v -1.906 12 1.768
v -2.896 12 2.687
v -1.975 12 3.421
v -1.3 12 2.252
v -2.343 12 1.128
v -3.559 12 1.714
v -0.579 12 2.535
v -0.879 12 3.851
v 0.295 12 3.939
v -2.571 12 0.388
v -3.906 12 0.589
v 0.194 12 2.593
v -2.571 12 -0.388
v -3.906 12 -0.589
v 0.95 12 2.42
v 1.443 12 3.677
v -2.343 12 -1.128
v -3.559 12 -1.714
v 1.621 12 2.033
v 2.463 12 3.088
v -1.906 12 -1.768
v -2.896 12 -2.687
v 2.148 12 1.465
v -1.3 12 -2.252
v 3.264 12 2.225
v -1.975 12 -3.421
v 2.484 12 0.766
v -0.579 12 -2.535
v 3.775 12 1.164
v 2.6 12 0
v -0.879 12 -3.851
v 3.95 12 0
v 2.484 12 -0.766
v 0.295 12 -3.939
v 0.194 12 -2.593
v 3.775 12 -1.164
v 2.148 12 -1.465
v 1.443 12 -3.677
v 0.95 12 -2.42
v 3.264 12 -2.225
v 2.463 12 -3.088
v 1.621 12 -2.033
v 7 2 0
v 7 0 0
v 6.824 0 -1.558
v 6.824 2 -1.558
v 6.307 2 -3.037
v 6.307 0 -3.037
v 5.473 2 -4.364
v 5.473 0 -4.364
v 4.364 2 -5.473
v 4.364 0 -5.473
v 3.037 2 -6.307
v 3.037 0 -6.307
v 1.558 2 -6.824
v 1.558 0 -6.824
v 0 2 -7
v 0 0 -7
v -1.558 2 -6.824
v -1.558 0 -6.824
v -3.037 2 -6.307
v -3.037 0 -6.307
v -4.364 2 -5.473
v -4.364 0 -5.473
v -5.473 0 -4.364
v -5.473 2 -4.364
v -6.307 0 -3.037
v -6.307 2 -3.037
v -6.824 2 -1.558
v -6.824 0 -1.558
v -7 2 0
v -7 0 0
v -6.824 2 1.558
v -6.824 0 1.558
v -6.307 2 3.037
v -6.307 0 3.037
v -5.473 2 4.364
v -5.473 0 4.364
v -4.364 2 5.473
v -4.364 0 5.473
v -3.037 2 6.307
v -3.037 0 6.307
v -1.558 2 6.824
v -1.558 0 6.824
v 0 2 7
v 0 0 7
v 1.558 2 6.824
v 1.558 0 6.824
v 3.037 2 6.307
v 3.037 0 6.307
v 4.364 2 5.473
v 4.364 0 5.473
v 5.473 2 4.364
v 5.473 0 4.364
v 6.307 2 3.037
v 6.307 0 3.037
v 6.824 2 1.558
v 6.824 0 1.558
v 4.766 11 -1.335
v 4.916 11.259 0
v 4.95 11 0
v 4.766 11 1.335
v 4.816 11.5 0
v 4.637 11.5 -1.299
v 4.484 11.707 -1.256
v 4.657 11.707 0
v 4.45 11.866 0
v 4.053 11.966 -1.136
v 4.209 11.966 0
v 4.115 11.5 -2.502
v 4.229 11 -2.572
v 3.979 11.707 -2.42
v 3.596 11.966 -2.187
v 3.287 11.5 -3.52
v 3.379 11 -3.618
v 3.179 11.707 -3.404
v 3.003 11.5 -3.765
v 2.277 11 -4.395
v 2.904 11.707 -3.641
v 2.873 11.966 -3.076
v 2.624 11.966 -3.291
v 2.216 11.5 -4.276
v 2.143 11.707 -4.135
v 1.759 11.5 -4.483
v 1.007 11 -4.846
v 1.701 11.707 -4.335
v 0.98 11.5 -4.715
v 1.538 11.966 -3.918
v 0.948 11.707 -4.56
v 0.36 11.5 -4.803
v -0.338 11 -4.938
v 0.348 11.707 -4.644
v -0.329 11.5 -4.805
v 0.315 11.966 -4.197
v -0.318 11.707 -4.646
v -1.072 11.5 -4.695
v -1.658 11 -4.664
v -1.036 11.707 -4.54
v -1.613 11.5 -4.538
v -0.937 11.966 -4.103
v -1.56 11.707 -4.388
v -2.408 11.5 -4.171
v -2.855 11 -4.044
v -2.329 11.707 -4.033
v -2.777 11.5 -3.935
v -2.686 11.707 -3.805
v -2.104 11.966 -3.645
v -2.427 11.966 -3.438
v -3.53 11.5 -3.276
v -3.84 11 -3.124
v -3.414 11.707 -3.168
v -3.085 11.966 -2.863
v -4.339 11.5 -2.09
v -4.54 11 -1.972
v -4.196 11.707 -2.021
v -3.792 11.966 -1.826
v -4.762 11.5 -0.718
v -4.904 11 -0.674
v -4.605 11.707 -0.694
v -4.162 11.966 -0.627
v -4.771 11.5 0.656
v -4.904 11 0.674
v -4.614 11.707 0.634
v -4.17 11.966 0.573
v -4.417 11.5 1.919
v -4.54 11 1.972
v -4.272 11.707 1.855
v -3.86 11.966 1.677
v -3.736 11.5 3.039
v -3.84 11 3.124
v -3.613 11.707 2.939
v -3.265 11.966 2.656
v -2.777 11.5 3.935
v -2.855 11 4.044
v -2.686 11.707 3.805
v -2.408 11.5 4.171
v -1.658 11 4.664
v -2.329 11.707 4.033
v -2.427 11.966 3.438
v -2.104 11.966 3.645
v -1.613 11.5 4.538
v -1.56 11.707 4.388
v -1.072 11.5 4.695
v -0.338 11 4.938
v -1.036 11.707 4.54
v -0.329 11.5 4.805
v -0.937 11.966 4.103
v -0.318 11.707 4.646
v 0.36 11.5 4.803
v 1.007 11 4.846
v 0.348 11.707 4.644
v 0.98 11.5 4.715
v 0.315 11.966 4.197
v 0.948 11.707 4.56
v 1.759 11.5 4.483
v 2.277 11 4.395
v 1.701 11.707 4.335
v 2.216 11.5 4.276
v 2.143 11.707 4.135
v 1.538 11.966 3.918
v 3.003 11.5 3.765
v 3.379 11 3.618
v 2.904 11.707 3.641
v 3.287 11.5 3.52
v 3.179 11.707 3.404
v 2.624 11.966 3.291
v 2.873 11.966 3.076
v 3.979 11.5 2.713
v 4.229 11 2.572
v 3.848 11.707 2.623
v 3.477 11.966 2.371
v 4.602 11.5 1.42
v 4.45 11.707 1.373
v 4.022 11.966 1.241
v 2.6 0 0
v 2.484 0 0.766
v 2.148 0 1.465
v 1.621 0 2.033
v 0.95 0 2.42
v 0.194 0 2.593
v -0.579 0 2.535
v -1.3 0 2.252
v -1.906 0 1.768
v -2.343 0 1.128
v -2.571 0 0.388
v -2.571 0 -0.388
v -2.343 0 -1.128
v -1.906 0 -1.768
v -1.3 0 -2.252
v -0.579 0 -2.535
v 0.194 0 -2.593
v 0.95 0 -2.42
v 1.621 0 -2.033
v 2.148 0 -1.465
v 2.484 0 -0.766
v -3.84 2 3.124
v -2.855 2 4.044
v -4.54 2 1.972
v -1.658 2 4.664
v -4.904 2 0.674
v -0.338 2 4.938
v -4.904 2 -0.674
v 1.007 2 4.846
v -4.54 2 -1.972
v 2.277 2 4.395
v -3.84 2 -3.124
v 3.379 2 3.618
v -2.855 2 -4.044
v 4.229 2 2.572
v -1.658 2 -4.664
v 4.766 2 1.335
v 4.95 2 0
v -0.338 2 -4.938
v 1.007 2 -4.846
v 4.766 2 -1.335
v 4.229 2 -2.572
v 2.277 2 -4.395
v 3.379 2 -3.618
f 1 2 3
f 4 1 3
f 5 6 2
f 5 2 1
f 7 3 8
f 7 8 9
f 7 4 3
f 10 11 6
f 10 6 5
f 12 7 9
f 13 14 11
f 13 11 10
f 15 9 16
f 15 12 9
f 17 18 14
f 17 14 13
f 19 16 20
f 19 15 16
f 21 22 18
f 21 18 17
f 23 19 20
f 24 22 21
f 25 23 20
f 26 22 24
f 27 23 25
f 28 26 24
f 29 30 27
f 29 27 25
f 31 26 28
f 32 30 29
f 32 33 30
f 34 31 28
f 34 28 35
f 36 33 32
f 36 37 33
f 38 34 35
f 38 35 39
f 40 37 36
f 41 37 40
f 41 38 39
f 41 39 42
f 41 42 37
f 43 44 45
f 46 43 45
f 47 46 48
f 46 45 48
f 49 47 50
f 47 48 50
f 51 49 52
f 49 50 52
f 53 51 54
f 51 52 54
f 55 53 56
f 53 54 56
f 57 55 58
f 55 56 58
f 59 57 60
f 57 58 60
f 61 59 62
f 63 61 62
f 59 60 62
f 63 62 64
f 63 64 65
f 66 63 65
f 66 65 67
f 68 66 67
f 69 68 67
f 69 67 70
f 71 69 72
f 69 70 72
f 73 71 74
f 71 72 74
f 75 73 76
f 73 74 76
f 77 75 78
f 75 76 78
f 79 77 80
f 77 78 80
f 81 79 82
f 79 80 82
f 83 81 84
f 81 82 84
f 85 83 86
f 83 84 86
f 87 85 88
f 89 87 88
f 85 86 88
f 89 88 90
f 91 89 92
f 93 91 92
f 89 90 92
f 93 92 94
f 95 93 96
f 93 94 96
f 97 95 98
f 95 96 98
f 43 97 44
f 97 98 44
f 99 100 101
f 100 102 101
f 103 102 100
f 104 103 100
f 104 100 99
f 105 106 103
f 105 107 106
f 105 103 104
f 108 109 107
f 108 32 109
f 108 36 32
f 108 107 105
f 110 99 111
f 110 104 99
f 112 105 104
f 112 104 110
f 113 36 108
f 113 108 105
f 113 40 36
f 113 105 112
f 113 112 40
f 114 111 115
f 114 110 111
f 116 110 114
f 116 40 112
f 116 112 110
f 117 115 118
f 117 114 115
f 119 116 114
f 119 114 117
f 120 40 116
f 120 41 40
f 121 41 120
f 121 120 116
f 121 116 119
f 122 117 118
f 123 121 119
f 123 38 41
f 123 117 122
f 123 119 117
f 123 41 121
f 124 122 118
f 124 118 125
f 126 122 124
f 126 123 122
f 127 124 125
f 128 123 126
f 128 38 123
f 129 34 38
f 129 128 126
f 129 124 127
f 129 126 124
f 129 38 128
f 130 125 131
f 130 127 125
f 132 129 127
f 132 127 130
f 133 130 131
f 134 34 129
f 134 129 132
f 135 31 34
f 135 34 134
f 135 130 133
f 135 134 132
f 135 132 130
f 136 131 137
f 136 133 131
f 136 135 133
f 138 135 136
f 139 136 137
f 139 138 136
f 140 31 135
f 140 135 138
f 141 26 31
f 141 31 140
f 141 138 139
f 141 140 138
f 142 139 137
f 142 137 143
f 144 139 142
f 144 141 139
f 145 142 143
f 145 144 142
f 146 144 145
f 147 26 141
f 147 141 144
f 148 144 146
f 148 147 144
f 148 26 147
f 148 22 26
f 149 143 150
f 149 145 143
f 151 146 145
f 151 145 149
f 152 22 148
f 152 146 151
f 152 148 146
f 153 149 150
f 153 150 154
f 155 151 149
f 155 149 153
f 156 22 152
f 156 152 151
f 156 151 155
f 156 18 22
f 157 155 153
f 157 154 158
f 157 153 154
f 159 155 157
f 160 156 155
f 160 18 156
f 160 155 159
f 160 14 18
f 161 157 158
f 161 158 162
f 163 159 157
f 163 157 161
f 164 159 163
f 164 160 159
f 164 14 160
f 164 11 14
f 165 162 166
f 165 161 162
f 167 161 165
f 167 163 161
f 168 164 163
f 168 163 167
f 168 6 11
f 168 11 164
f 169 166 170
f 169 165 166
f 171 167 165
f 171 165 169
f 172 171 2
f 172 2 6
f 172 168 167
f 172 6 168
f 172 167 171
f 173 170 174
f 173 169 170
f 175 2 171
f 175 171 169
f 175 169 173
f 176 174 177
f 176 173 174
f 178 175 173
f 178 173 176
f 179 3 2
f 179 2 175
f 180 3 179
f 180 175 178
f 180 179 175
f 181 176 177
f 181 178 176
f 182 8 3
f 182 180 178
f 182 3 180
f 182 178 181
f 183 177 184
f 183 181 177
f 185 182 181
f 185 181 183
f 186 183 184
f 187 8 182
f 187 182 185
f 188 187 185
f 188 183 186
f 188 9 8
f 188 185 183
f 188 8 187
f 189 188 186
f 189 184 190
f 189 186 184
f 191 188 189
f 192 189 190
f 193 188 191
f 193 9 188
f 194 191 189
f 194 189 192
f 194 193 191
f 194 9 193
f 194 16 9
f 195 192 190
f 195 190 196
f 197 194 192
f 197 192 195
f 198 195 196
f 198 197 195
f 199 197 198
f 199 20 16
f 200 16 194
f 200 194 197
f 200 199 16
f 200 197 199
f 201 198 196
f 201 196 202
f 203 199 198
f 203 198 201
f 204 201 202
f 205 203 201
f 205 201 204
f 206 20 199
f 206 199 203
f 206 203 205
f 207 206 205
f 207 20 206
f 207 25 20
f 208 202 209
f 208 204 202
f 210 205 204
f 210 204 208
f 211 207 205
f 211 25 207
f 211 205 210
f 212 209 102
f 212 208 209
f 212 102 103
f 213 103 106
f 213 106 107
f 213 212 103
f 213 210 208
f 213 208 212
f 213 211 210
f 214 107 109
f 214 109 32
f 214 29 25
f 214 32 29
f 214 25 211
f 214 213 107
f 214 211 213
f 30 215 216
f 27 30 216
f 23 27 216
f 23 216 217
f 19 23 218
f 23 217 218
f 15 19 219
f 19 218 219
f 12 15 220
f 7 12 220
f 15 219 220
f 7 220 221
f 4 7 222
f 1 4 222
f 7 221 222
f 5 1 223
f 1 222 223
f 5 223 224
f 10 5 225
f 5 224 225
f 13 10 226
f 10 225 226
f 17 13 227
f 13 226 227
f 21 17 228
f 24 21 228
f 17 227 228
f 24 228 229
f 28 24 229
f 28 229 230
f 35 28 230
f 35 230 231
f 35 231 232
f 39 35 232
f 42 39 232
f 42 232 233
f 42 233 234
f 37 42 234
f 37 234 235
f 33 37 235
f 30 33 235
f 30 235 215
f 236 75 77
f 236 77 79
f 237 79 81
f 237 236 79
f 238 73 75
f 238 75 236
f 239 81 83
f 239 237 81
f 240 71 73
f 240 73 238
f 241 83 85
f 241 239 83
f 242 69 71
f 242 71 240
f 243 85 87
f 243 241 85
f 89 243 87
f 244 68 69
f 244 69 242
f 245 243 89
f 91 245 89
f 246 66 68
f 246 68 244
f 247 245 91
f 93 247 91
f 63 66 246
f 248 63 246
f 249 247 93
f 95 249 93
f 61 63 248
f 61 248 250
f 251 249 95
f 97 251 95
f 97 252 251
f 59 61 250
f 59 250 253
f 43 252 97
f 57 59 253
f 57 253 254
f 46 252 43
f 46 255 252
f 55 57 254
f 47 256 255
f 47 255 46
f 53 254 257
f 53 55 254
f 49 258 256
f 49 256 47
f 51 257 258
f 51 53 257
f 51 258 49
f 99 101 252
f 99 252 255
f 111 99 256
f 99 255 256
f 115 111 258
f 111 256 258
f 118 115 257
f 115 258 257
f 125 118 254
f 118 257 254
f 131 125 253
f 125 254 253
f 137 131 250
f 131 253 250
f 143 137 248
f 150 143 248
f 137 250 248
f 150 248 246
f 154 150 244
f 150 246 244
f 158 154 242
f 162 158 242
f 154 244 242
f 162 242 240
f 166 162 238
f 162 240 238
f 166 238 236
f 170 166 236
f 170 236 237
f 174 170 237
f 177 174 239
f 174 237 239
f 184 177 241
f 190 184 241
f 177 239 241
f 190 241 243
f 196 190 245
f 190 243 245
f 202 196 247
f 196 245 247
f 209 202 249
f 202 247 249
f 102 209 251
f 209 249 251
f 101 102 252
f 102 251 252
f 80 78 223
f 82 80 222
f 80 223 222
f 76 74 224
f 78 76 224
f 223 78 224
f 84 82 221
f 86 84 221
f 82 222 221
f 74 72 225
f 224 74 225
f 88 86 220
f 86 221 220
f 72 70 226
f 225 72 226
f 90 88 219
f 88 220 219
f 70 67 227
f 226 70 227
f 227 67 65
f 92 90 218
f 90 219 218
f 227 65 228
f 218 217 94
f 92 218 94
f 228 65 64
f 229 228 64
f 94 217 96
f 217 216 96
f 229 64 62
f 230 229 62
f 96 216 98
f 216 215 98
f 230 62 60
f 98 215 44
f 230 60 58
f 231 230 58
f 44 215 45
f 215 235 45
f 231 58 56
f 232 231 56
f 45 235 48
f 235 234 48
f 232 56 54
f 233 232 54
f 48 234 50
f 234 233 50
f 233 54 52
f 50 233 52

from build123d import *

# Parameters (mm, degrees)
SKETCH1_R           = 7
BOSS_EXTRUDE1_DEPTH = 2
SKETCH2_R           = 4.95
BOSS_EXTRUDE2_DEPTH = 10
SKETCH3_R           = 2.6
CUT_EXTRUDE1_DEPTH  = 13
FILLET1_R           = 1


with BuildPart() as part:
    # Sketch1 → Boss-Extrude1 (new body)
    with BuildSketch(Plane(origin=(0, 0, 0), x_dir=(1, 0, 0), z_dir=(0, 1, 0))):
        Circle(SKETCH1_R)
    extrude(amount=BOSS_EXTRUDE1_DEPTH)

    # Sketch2 → Boss-Extrude2 (add)
    with BuildSketch(Plane(origin=(0, 2, 0), x_dir=(1, 0, 0), z_dir=(0, 1, 0))):
        Circle(SKETCH2_R)
    extrude(amount=BOSS_EXTRUDE2_DEPTH)

    # Sketch3 → Cut-Extrude1 (cut, through all)
    with BuildSketch(Plane.XZ):
        Circle(SKETCH3_R)
    extrude(amount=-CUT_EXTRUDE1_DEPTH, mode=Mode.SUBTRACT)

    # Fillet1
    fillet1_edges = [part.edges().sort_by_distance(p)[0] for p in [
        (-4.95, 12, 0),
    ]]
    fillet(fillet1_edges, radius=FILLET1_R)


solid = part.part
